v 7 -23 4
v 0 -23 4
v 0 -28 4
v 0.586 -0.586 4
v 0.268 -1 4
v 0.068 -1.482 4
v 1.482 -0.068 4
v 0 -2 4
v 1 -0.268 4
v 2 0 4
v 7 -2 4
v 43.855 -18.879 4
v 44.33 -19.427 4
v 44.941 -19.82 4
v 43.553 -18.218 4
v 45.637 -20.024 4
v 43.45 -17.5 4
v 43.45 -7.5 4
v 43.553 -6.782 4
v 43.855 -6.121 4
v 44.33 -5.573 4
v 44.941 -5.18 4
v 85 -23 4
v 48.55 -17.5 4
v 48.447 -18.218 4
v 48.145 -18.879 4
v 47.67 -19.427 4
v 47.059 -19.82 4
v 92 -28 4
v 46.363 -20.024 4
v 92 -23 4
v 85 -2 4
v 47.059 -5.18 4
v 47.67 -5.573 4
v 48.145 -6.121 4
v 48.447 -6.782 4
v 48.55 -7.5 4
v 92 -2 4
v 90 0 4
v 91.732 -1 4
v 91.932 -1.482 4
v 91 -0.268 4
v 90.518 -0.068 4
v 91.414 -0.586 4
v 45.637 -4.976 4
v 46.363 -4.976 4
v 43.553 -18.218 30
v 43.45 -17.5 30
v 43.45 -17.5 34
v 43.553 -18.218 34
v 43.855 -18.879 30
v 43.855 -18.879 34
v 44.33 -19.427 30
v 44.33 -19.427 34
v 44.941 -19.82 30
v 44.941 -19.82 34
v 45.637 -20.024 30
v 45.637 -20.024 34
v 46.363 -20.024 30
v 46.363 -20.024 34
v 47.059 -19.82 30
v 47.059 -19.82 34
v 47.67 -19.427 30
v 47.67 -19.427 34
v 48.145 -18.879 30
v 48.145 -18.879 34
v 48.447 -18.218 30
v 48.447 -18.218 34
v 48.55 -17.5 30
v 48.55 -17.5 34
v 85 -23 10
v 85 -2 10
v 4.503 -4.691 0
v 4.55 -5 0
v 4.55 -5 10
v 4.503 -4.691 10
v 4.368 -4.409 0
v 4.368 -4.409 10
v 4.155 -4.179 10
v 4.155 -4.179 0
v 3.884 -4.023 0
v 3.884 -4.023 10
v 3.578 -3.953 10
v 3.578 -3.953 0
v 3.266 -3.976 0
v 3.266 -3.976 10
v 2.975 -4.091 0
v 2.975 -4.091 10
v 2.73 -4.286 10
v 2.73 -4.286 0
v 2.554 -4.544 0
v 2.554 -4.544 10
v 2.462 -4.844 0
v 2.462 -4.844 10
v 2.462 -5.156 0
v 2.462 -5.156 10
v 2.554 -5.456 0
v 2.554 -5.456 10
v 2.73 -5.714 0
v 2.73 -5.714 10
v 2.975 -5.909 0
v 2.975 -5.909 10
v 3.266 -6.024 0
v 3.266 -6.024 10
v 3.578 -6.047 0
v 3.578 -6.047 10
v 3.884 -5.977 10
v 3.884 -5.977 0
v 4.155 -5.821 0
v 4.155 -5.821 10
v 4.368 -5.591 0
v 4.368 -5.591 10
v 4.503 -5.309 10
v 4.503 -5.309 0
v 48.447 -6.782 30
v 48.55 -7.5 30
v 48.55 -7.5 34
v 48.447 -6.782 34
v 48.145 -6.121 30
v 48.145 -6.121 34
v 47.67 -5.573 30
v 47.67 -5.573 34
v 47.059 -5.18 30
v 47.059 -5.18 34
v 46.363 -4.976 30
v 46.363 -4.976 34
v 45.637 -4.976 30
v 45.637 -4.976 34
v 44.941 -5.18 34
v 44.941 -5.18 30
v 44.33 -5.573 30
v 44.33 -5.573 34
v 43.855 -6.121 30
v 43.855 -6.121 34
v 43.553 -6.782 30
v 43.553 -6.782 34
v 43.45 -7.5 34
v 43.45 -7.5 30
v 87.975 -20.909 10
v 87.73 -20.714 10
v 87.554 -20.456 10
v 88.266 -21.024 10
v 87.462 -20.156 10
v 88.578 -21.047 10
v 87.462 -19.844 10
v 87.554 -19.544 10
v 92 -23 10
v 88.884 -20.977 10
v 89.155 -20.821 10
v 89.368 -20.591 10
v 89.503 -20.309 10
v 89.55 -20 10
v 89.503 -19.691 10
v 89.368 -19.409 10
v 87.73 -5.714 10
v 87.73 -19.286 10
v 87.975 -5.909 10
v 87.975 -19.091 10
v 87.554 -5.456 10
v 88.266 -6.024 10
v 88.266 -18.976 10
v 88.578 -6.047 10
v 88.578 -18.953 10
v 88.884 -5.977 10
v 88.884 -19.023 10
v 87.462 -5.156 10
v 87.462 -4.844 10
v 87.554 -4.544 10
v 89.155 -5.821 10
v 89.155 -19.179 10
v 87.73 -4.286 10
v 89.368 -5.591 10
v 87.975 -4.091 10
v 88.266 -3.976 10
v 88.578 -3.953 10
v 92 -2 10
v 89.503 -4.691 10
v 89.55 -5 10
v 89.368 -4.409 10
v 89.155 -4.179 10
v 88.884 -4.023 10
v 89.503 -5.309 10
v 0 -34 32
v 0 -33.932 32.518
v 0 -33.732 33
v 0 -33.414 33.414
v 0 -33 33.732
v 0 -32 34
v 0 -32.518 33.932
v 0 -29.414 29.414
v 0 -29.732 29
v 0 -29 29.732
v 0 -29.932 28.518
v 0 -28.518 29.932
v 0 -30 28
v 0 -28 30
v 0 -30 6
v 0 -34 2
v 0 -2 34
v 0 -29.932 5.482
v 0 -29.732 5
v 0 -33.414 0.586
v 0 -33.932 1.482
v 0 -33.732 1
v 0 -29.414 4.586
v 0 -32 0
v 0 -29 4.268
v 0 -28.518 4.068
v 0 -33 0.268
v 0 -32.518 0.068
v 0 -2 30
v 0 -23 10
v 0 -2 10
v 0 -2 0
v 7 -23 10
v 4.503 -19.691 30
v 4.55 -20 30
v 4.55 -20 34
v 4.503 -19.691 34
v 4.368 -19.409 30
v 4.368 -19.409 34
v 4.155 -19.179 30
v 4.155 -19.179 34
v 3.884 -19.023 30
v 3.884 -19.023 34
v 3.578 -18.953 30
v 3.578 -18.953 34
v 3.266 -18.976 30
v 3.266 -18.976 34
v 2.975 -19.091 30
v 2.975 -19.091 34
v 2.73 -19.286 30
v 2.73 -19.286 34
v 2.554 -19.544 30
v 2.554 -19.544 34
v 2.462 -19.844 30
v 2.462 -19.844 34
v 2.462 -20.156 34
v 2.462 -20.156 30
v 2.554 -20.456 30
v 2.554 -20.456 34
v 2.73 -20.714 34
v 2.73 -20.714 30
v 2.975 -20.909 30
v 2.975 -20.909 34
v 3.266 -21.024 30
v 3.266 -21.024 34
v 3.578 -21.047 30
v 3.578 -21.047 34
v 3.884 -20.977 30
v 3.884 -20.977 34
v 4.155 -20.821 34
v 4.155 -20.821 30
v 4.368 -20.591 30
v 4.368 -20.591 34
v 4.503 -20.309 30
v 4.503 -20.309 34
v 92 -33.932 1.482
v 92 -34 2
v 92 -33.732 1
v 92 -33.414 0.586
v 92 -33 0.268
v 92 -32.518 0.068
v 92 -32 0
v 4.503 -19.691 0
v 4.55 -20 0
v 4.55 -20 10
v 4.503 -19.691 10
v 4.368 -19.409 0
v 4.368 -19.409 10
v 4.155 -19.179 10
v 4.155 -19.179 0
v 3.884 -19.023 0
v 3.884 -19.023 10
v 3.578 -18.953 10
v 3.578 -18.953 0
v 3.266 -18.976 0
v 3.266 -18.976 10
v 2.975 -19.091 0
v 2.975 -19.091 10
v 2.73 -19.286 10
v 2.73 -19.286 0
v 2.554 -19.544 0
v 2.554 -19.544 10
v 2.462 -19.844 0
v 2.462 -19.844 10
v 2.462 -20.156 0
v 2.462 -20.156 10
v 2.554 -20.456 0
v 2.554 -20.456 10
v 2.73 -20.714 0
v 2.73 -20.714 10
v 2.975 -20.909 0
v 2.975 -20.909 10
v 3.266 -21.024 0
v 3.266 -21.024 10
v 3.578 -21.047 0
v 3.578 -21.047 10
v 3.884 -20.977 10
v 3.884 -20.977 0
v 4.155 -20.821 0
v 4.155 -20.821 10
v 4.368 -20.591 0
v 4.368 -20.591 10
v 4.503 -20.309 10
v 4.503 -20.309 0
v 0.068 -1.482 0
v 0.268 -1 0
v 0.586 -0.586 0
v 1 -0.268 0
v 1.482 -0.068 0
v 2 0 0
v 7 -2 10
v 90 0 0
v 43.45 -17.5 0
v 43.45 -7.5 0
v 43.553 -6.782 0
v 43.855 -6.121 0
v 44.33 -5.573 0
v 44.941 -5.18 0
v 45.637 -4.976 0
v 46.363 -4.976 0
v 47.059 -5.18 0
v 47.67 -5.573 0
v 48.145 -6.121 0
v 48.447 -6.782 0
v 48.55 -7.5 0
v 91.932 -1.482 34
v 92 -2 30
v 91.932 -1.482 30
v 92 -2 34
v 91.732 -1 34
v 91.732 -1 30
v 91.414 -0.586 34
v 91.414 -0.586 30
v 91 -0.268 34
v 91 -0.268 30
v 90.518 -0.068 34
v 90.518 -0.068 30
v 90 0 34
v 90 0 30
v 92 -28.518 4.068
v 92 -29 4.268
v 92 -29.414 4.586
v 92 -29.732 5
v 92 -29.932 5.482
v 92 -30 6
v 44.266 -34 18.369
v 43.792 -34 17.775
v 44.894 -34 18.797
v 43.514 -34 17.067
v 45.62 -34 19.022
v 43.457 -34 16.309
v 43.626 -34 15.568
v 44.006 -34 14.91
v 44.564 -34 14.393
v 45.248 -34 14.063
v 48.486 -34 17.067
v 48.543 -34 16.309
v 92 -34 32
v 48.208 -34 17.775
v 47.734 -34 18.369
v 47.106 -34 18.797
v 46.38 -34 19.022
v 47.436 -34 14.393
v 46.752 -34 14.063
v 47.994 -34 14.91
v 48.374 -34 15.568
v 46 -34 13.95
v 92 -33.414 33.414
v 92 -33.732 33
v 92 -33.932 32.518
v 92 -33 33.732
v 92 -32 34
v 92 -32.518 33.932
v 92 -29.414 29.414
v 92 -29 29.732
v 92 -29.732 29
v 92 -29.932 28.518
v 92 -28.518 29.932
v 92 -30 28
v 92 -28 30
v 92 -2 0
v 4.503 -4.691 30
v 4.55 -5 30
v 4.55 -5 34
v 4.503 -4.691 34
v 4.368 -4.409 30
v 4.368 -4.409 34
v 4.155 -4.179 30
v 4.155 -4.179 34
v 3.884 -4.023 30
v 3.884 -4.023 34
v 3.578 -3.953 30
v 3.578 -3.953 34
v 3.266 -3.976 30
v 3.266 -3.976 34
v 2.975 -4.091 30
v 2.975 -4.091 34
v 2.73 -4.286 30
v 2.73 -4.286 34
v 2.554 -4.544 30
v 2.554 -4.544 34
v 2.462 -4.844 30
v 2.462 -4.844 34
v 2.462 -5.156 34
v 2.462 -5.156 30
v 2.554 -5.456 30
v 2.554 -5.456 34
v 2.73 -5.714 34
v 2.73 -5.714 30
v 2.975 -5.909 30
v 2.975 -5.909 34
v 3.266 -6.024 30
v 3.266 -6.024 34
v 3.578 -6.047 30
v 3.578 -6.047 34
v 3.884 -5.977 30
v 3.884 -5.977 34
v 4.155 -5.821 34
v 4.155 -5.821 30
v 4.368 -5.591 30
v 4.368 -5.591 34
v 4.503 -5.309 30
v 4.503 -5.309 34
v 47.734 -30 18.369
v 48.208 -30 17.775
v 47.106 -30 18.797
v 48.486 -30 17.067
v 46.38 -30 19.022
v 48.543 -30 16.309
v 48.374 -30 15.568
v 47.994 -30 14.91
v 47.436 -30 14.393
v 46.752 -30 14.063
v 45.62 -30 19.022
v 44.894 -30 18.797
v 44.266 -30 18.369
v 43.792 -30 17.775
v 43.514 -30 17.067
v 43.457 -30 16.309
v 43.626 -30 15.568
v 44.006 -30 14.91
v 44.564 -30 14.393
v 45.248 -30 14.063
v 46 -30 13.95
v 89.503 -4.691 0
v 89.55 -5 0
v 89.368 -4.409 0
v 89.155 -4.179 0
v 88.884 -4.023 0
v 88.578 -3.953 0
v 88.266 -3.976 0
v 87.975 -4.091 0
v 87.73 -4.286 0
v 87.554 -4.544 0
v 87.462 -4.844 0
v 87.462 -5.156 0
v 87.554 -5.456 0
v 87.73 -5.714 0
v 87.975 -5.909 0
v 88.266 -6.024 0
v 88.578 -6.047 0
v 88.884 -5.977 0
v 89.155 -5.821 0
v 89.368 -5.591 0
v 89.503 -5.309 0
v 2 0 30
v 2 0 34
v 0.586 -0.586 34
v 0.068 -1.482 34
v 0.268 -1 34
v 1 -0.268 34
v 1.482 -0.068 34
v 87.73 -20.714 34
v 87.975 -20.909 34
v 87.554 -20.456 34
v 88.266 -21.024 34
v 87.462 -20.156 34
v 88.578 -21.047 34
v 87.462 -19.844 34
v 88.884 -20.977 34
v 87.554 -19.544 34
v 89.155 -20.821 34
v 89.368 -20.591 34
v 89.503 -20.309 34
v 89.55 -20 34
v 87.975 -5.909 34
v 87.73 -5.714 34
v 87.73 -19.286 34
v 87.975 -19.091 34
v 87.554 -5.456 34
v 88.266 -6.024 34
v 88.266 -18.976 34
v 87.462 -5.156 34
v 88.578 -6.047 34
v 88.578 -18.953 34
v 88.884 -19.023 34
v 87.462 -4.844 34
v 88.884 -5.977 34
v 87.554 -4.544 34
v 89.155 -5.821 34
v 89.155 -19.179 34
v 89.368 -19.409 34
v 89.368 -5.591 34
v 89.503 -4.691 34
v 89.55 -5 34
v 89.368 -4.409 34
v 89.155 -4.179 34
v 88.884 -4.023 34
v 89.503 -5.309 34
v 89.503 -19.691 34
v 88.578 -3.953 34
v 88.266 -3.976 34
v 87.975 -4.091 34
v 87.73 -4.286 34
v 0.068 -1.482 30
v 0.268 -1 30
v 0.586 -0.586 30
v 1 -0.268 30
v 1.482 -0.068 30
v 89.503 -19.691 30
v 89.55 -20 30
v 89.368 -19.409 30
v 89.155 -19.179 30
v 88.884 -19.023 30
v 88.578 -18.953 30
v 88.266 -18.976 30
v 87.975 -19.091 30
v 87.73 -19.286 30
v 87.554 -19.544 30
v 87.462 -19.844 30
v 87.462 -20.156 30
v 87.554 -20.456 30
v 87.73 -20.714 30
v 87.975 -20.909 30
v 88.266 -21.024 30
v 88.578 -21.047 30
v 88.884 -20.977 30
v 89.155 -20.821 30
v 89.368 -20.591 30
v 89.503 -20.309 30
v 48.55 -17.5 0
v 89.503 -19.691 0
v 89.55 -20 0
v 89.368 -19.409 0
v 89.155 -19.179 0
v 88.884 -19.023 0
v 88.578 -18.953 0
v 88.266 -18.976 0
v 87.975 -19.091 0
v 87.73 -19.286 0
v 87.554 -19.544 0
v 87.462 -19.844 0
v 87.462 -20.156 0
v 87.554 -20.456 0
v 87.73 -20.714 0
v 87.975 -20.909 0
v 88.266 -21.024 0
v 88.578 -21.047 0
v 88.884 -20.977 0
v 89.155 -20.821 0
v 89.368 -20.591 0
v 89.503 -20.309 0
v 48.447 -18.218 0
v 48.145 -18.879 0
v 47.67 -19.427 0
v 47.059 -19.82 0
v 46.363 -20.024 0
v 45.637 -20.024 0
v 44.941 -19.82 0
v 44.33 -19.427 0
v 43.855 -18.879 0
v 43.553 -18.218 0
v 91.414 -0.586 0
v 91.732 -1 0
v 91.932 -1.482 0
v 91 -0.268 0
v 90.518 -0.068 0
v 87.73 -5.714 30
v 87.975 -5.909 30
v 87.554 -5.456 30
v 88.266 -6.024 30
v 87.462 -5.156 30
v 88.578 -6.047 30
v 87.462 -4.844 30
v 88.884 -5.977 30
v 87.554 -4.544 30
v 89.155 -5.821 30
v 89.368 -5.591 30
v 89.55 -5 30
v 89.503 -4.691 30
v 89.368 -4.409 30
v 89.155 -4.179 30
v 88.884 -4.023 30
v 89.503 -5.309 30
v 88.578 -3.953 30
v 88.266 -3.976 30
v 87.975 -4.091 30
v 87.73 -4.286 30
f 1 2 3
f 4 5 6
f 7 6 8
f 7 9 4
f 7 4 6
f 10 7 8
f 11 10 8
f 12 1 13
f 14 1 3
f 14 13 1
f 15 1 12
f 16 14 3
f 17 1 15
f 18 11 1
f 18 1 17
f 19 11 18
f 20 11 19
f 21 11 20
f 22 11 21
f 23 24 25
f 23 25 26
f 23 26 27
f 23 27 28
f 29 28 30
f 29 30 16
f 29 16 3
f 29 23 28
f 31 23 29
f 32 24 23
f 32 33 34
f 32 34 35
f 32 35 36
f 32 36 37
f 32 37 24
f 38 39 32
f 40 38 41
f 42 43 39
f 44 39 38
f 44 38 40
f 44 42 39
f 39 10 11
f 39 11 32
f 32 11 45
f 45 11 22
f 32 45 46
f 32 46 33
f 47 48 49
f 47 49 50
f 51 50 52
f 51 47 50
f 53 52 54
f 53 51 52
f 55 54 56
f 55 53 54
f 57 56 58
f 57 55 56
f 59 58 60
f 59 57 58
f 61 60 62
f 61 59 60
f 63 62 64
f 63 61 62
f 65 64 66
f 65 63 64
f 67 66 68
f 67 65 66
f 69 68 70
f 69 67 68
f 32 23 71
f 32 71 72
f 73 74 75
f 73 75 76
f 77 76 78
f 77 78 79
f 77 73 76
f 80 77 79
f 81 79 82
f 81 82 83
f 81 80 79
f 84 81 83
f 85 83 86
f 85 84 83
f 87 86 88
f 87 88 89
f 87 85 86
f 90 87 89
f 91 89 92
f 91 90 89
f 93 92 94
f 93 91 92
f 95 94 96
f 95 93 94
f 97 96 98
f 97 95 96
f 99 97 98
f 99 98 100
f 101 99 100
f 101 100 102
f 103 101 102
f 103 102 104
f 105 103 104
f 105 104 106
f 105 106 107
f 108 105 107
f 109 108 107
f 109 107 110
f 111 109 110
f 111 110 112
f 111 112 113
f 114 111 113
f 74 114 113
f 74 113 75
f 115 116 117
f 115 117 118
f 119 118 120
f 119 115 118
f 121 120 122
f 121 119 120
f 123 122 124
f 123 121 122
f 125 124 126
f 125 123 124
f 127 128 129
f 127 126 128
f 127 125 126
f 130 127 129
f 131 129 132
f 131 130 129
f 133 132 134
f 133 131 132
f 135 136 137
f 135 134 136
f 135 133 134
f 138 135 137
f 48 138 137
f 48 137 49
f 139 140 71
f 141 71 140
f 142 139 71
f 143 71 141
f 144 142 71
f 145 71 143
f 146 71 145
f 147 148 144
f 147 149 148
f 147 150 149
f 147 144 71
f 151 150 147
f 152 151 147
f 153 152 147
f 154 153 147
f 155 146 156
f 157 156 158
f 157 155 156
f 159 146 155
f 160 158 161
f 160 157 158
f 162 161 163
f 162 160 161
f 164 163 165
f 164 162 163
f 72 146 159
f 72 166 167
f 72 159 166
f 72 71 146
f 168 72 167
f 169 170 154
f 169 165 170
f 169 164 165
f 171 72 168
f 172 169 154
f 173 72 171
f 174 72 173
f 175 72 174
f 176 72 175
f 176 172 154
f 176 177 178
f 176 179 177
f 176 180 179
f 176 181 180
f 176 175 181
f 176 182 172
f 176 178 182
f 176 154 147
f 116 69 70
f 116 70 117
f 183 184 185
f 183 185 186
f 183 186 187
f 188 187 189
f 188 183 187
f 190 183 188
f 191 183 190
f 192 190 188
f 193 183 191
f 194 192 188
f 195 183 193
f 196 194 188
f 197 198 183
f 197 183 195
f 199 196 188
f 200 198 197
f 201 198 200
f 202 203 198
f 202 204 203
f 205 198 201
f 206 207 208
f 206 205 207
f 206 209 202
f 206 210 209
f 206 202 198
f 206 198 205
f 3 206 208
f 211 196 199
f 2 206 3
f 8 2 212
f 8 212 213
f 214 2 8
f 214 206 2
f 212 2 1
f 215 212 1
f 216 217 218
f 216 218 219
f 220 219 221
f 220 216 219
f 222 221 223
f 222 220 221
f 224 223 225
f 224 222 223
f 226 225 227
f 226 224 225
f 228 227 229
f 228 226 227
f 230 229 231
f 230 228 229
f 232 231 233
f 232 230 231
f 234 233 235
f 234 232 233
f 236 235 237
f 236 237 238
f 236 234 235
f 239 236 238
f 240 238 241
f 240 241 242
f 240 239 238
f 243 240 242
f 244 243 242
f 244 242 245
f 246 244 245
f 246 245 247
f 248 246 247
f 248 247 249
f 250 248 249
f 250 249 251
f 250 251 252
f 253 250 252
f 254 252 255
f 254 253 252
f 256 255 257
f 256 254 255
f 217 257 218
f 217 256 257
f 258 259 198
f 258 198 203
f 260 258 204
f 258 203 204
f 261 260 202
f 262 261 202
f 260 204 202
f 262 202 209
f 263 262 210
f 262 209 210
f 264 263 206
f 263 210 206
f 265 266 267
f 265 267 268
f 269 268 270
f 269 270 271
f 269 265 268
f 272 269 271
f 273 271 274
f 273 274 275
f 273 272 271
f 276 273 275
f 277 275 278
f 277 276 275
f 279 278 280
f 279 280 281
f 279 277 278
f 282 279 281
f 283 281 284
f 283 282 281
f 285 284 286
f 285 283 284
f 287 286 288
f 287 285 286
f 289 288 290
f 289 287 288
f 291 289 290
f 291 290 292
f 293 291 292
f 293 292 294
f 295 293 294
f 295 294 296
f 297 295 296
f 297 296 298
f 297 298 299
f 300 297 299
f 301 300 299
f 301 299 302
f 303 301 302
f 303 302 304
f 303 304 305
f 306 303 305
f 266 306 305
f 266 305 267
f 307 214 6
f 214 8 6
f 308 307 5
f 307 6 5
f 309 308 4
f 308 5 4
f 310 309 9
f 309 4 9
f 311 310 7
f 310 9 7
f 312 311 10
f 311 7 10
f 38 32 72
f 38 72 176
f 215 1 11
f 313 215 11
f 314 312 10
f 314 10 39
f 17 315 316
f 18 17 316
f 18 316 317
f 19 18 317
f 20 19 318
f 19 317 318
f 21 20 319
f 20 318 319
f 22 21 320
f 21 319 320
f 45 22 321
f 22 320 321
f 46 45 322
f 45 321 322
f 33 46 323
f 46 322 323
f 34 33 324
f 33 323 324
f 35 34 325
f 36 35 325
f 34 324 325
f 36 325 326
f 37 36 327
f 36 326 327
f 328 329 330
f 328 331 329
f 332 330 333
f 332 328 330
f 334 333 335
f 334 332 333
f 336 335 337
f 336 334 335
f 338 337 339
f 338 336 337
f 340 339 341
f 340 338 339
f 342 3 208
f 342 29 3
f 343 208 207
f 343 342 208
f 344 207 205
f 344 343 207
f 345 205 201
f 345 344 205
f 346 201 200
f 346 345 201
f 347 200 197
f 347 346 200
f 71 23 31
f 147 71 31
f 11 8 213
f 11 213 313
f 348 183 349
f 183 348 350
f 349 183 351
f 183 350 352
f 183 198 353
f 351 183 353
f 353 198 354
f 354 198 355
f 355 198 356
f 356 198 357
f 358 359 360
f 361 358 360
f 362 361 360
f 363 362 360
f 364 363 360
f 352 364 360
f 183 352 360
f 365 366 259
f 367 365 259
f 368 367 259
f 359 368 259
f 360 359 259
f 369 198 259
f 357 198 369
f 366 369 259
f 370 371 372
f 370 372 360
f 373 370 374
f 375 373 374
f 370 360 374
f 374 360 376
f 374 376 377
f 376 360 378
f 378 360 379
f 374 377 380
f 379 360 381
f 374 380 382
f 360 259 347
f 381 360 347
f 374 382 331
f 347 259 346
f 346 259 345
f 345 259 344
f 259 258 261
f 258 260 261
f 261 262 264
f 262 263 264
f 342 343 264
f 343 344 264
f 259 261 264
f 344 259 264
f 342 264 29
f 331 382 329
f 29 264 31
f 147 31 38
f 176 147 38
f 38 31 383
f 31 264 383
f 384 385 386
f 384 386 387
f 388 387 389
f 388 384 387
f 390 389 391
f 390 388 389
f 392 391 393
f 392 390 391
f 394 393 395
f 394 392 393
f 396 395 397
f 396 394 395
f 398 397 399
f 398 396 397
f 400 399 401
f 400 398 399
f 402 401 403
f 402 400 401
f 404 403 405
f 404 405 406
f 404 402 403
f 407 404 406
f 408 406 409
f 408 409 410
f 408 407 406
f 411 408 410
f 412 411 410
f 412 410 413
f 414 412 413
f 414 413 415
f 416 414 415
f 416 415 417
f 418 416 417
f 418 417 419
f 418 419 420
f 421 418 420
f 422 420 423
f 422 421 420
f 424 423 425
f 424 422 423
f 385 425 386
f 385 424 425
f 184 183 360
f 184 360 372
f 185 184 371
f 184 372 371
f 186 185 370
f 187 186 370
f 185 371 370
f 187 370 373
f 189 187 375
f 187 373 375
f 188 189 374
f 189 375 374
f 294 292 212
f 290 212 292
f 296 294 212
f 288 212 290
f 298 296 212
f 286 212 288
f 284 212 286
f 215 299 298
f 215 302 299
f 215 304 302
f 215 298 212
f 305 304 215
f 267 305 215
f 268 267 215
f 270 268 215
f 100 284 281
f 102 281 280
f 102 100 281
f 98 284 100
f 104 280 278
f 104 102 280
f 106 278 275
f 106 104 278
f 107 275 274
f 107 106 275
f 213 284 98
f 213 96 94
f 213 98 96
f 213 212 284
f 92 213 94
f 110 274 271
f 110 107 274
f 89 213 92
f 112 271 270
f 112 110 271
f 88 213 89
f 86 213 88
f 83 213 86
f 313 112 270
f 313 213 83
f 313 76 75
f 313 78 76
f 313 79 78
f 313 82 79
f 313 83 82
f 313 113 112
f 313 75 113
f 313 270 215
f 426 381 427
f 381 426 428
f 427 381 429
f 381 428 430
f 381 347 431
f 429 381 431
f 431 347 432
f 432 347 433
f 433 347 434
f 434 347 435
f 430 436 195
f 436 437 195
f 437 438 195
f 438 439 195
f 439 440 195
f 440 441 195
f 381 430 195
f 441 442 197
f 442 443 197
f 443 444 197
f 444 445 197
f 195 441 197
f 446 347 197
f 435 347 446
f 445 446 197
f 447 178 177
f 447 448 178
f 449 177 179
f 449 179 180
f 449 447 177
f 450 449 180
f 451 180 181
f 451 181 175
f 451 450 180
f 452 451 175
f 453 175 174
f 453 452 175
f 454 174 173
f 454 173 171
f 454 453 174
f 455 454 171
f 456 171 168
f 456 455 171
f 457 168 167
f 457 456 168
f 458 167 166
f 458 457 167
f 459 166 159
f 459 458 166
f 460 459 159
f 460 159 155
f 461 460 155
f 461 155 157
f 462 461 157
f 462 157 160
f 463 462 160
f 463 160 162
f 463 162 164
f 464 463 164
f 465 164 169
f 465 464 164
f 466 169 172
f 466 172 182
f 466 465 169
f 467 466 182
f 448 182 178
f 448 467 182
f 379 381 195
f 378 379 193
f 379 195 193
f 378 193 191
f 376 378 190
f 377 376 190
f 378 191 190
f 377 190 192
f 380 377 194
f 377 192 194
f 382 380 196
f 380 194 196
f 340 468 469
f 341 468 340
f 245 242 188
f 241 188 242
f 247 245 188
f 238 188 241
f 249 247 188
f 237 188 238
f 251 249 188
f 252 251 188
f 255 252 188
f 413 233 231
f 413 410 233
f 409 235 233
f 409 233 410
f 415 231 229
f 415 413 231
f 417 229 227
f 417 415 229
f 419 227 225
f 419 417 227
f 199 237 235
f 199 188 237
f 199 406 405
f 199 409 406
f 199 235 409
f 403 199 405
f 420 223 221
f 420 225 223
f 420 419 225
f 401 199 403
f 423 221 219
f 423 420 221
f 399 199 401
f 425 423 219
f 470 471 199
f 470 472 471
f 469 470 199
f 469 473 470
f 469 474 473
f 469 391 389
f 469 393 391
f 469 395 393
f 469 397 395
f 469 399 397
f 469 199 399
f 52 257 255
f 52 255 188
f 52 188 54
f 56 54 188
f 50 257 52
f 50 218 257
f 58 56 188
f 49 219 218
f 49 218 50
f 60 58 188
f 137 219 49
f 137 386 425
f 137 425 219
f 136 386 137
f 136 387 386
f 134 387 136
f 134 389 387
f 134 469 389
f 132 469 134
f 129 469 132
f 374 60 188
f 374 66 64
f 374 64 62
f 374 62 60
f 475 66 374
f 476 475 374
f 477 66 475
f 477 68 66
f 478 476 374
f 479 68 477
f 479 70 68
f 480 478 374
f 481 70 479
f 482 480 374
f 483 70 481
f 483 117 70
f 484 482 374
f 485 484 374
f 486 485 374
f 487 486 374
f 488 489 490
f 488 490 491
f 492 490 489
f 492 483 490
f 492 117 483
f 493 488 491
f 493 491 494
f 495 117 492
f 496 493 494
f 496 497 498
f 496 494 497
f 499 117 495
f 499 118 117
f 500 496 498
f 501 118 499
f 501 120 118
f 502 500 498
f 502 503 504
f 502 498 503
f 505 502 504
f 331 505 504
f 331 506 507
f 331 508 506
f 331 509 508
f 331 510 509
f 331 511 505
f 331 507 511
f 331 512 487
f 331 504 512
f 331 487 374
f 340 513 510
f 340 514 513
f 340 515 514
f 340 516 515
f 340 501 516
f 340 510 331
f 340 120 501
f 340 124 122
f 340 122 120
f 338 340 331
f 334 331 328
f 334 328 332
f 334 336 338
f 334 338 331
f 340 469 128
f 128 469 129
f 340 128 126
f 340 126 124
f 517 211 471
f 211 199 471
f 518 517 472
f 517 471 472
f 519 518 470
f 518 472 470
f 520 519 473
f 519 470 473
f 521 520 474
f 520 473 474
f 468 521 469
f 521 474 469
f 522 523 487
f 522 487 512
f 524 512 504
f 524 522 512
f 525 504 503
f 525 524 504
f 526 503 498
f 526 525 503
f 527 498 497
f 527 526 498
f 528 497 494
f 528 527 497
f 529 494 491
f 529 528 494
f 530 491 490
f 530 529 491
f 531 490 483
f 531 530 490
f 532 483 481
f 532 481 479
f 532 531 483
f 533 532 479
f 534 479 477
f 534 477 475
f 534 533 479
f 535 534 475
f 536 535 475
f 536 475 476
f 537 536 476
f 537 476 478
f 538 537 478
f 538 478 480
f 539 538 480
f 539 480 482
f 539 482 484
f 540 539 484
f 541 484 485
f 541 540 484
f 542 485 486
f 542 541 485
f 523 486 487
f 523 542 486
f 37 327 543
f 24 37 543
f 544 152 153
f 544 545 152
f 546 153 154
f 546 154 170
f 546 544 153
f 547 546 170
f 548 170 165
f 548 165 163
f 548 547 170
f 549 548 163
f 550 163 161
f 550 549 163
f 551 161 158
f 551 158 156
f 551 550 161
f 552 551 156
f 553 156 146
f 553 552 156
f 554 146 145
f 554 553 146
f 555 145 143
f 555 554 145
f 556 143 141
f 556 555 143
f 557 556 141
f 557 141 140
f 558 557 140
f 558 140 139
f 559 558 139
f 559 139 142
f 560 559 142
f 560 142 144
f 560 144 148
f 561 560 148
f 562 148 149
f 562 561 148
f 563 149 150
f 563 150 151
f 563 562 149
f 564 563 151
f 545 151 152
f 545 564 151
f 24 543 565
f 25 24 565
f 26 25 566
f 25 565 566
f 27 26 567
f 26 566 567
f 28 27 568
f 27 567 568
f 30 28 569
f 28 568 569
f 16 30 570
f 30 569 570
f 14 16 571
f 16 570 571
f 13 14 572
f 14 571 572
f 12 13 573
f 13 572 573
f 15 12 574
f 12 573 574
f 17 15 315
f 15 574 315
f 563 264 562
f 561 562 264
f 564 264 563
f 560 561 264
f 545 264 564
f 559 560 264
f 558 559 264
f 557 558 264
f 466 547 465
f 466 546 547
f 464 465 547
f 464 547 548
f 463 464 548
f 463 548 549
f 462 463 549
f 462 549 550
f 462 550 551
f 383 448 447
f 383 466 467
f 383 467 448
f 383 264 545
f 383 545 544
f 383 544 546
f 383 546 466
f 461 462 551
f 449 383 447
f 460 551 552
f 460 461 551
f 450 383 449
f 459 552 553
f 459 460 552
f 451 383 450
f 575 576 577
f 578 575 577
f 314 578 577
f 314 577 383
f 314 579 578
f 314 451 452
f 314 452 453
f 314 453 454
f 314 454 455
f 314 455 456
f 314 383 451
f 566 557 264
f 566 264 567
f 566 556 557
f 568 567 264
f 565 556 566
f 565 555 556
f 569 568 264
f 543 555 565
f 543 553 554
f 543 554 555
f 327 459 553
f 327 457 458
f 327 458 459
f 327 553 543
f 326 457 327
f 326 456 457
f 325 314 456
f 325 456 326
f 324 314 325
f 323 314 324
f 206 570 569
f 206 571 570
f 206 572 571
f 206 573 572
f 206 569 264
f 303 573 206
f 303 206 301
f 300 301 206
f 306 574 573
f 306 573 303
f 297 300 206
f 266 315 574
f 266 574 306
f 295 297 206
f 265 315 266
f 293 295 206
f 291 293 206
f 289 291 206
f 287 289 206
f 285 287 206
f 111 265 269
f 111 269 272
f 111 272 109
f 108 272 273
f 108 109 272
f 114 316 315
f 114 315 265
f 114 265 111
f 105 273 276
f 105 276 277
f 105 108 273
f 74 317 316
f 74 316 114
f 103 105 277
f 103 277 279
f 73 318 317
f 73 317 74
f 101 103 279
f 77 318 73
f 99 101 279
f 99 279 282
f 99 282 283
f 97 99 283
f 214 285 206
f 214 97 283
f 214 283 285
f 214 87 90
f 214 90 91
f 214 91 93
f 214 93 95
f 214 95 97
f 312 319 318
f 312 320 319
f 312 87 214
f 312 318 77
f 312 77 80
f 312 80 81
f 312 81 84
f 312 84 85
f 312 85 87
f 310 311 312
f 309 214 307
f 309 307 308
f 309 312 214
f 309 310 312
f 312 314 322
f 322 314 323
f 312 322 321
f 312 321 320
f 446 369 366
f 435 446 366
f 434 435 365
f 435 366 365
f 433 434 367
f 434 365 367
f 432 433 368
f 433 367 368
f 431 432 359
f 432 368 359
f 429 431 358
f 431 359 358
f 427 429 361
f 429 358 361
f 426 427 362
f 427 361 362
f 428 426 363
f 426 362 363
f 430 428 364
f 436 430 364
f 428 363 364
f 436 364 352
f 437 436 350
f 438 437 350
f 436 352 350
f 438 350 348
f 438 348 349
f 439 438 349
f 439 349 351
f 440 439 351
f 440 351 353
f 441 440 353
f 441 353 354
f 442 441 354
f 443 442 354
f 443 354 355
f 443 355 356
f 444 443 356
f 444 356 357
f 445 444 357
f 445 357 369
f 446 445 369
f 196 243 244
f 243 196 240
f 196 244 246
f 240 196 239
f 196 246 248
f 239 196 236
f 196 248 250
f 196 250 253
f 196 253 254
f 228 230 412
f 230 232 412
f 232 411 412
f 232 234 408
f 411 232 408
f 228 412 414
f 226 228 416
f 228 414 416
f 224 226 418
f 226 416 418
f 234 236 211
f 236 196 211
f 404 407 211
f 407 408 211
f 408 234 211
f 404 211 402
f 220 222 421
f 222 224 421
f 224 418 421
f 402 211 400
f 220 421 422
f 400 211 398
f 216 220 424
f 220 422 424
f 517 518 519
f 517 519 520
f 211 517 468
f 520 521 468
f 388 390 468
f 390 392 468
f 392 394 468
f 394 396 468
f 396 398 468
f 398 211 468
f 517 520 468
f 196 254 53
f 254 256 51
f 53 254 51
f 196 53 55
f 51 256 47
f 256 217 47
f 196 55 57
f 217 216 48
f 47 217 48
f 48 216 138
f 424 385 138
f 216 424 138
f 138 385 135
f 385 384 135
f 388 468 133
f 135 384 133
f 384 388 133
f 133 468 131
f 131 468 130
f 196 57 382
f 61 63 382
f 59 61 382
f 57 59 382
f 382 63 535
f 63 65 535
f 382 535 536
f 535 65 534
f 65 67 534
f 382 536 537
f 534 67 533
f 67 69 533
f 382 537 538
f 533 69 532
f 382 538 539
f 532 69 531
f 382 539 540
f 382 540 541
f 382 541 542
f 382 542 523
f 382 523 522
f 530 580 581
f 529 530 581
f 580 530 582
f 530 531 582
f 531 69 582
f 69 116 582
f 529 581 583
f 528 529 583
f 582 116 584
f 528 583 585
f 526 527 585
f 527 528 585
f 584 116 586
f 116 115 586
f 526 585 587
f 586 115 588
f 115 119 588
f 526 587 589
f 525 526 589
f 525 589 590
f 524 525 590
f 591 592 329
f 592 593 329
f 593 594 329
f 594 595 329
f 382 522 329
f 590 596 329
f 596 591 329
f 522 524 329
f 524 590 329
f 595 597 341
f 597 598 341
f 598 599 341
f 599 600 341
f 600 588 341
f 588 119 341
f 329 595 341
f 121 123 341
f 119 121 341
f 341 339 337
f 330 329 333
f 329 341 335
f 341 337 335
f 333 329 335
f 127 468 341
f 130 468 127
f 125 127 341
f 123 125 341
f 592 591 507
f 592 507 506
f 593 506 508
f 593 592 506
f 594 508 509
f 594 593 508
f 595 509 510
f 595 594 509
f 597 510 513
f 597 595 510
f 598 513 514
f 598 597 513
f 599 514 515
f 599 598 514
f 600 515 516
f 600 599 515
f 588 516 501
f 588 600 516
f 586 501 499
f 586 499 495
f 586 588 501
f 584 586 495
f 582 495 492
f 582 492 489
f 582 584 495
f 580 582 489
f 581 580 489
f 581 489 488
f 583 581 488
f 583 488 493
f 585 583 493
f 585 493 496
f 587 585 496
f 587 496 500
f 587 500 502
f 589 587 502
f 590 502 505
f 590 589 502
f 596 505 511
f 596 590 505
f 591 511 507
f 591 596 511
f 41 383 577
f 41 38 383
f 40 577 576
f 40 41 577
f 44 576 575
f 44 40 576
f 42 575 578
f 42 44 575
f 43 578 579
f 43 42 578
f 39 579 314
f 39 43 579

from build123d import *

# Parameters (mm, degrees)
SKETCH_1_W          = 92
SKETCH_1_H          = 30
SKETCH_1_R          = 1.05
EXTRUDE_1_DEPTH     = 4
SKETCH_4_W          = 92
SKETCH_4_H          = 30
EXTRUDE_4_DEPTH     = 4
SKETCH_5_W          = 92
SKETCH_5_H          = 34
SKETCH_5_R          = 1.05
EXTRUDE_5_DEPTH     = 4
FILLET_4_R          = 2
CUT_EXTRUDE_1_DEPTH = 45
SKETCH_8_R          = 2.55
CUT_EXTRUDE_2_DEPTH = 5
SKETCH_9_W          = 7
SKETCH_9_H          = 21
SKETCH_9_R          = 1.05
EXTRUDE_6_DEPTH     = 6


with BuildPart() as part:
    # 草图1 → 凸台-拉伸1 (new body)
    with BuildSketch(Plane.XY):
        with Locations((46, -15)):
            Rectangle(SKETCH_1_W, SKETCH_1_H)
        with Locations((3.5, -5)):
            Circle(SKETCH_1_R, mode=Mode.SUBTRACT)
        with Locations((3.5, -20)):
            Circle(SKETCH_1_R, mode=Mode.SUBTRACT)
        with Locations((88.5, -5)):
            Circle(SKETCH_1_R, mode=Mode.SUBTRACT)
        with Locations((88.5, -20)):
            Circle(SKETCH_1_R, mode=Mode.SUBTRACT)
        with BuildLine():
            Line((43.45, -17.5), (43.45, -7.5))
            ThreePointArc((43.45, -7.5), (46, -4.95), (48.55, -7.5))
            Line((48.55, -7.5), (48.55, -17.5))
            ThreePointArc((48.55, -17.5), (46, -20.05), (43.45, -17.5))
        make_face(mode=Mode.SUBTRACT)
    extrude(amount=EXTRUDE_1_DEPTH)

    # 草图4 → 凸台-拉伸4 (add)
    with BuildSketch(Plane(origin=(0, -30, 0), x_dir=(-1, 0, 0), z_dir=(0, -1, 0))):
        with Locations((-46, -15)):
            Rectangle(SKETCH_4_W, SKETCH_4_H)
    extrude(amount=EXTRUDE_4_DEPTH)

    # 草图5 → 凸台-拉伸5 (add)
    with BuildSketch(Plane.XY.offset(30)):
        with Locations((46, -17)):
            Rectangle(SKETCH_5_W, SKETCH_5_H)
        with Locations((3.5, -5)):
            Circle(SKETCH_5_R, mode=Mode.SUBTRACT)
        with Locations((3.5, -20)):
            Circle(SKETCH_5_R, mode=Mode.SUBTRACT)
        with Locations((88.5, -20)):
            Circle(SKETCH_5_R, mode=Mode.SUBTRACT)
        with Locations((88.5, -5)):
            Circle(SKETCH_5_R, mode=Mode.SUBTRACT)
    extrude(amount=EXTRUDE_5_DEPTH)

    # 圆角4
    fillet_4_edges = [part.edges().sort_by_distance(p)[0] for p in [
        (46, -30, 30),
        (46, -34, 0),
        (46, -34, 34),
        (0, 0, 32),
        (92, 0, 32),
        (0, 0, 2),
        (92, 0, 2),
        (46, -30, 4),
    ]]
    fillet(fillet_4_edges, radius=FILLET_4_R)

    # 草图7 → 切除-拉伸1 (cut)
    with BuildSketch(Plane(origin=(0, 0, 0), x_dir=(-1, 0, 0), z_dir=(0, 0, -1))):
        with BuildLine():
            Line((-48.55, -17.5), (-48.55, -7.5))
            ThreePointArc((-48.55, -7.5), (-46, -4.95), (-43.45, -7.5))
            Line((-43.45, -7.5), (-43.45, -17.5))
            ThreePointArc((-43.45, -17.5), (-46, -20.05), (-48.55, -17.5))
        make_face()
    extrude(amount=-CUT_EXTRUDE_1_DEPTH, mode=Mode.SUBTRACT)

    # 草图8 → 切除-拉伸2 (cut)
    with BuildSketch(Plane(origin=(0, -34, 0), x_dir=(-1, 0, 0), z_dir=(0, -1, 0))):
        with Locations(Location((-46, -16.5, 0), (0, 0, 90))):
            Circle(SKETCH_8_R)
    extrude(amount=-CUT_EXTRUDE_2_DEPTH, mode=Mode.SUBTRACT)

    # 草图9 → 凸台-拉伸6 (add)
    # profile 1 of 2: a face of its own
    with BuildSketch(Plane.XY.offset(4)):
        with Locations((88.5, -12.5)):
            Rectangle(SKETCH_9_W, SKETCH_9_H)
        with Locations((88.5, -5)):
            Circle(SKETCH_9_R, mode=Mode.SUBTRACT)
        with Locations((88.5, -20)):
            Circle(SKETCH_9_R, mode=Mode.SUBTRACT)
    # profile 2 of 2: a face of its own
    with BuildSketch(Plane.XY.offset(4)):
        with Locations((3.5, -12.5)):
            Rectangle(SKETCH_9_W, SKETCH_9_H)
        with Locations((3.5, -5)):
            Circle(SKETCH_9_R, mode=Mode.SUBTRACT)
        with Locations((3.5, -20)):
            Circle(SKETCH_9_R, mode=Mode.SUBTRACT)
    extrude(amount=EXTRUDE_6_DEPTH)


solid = part.part
